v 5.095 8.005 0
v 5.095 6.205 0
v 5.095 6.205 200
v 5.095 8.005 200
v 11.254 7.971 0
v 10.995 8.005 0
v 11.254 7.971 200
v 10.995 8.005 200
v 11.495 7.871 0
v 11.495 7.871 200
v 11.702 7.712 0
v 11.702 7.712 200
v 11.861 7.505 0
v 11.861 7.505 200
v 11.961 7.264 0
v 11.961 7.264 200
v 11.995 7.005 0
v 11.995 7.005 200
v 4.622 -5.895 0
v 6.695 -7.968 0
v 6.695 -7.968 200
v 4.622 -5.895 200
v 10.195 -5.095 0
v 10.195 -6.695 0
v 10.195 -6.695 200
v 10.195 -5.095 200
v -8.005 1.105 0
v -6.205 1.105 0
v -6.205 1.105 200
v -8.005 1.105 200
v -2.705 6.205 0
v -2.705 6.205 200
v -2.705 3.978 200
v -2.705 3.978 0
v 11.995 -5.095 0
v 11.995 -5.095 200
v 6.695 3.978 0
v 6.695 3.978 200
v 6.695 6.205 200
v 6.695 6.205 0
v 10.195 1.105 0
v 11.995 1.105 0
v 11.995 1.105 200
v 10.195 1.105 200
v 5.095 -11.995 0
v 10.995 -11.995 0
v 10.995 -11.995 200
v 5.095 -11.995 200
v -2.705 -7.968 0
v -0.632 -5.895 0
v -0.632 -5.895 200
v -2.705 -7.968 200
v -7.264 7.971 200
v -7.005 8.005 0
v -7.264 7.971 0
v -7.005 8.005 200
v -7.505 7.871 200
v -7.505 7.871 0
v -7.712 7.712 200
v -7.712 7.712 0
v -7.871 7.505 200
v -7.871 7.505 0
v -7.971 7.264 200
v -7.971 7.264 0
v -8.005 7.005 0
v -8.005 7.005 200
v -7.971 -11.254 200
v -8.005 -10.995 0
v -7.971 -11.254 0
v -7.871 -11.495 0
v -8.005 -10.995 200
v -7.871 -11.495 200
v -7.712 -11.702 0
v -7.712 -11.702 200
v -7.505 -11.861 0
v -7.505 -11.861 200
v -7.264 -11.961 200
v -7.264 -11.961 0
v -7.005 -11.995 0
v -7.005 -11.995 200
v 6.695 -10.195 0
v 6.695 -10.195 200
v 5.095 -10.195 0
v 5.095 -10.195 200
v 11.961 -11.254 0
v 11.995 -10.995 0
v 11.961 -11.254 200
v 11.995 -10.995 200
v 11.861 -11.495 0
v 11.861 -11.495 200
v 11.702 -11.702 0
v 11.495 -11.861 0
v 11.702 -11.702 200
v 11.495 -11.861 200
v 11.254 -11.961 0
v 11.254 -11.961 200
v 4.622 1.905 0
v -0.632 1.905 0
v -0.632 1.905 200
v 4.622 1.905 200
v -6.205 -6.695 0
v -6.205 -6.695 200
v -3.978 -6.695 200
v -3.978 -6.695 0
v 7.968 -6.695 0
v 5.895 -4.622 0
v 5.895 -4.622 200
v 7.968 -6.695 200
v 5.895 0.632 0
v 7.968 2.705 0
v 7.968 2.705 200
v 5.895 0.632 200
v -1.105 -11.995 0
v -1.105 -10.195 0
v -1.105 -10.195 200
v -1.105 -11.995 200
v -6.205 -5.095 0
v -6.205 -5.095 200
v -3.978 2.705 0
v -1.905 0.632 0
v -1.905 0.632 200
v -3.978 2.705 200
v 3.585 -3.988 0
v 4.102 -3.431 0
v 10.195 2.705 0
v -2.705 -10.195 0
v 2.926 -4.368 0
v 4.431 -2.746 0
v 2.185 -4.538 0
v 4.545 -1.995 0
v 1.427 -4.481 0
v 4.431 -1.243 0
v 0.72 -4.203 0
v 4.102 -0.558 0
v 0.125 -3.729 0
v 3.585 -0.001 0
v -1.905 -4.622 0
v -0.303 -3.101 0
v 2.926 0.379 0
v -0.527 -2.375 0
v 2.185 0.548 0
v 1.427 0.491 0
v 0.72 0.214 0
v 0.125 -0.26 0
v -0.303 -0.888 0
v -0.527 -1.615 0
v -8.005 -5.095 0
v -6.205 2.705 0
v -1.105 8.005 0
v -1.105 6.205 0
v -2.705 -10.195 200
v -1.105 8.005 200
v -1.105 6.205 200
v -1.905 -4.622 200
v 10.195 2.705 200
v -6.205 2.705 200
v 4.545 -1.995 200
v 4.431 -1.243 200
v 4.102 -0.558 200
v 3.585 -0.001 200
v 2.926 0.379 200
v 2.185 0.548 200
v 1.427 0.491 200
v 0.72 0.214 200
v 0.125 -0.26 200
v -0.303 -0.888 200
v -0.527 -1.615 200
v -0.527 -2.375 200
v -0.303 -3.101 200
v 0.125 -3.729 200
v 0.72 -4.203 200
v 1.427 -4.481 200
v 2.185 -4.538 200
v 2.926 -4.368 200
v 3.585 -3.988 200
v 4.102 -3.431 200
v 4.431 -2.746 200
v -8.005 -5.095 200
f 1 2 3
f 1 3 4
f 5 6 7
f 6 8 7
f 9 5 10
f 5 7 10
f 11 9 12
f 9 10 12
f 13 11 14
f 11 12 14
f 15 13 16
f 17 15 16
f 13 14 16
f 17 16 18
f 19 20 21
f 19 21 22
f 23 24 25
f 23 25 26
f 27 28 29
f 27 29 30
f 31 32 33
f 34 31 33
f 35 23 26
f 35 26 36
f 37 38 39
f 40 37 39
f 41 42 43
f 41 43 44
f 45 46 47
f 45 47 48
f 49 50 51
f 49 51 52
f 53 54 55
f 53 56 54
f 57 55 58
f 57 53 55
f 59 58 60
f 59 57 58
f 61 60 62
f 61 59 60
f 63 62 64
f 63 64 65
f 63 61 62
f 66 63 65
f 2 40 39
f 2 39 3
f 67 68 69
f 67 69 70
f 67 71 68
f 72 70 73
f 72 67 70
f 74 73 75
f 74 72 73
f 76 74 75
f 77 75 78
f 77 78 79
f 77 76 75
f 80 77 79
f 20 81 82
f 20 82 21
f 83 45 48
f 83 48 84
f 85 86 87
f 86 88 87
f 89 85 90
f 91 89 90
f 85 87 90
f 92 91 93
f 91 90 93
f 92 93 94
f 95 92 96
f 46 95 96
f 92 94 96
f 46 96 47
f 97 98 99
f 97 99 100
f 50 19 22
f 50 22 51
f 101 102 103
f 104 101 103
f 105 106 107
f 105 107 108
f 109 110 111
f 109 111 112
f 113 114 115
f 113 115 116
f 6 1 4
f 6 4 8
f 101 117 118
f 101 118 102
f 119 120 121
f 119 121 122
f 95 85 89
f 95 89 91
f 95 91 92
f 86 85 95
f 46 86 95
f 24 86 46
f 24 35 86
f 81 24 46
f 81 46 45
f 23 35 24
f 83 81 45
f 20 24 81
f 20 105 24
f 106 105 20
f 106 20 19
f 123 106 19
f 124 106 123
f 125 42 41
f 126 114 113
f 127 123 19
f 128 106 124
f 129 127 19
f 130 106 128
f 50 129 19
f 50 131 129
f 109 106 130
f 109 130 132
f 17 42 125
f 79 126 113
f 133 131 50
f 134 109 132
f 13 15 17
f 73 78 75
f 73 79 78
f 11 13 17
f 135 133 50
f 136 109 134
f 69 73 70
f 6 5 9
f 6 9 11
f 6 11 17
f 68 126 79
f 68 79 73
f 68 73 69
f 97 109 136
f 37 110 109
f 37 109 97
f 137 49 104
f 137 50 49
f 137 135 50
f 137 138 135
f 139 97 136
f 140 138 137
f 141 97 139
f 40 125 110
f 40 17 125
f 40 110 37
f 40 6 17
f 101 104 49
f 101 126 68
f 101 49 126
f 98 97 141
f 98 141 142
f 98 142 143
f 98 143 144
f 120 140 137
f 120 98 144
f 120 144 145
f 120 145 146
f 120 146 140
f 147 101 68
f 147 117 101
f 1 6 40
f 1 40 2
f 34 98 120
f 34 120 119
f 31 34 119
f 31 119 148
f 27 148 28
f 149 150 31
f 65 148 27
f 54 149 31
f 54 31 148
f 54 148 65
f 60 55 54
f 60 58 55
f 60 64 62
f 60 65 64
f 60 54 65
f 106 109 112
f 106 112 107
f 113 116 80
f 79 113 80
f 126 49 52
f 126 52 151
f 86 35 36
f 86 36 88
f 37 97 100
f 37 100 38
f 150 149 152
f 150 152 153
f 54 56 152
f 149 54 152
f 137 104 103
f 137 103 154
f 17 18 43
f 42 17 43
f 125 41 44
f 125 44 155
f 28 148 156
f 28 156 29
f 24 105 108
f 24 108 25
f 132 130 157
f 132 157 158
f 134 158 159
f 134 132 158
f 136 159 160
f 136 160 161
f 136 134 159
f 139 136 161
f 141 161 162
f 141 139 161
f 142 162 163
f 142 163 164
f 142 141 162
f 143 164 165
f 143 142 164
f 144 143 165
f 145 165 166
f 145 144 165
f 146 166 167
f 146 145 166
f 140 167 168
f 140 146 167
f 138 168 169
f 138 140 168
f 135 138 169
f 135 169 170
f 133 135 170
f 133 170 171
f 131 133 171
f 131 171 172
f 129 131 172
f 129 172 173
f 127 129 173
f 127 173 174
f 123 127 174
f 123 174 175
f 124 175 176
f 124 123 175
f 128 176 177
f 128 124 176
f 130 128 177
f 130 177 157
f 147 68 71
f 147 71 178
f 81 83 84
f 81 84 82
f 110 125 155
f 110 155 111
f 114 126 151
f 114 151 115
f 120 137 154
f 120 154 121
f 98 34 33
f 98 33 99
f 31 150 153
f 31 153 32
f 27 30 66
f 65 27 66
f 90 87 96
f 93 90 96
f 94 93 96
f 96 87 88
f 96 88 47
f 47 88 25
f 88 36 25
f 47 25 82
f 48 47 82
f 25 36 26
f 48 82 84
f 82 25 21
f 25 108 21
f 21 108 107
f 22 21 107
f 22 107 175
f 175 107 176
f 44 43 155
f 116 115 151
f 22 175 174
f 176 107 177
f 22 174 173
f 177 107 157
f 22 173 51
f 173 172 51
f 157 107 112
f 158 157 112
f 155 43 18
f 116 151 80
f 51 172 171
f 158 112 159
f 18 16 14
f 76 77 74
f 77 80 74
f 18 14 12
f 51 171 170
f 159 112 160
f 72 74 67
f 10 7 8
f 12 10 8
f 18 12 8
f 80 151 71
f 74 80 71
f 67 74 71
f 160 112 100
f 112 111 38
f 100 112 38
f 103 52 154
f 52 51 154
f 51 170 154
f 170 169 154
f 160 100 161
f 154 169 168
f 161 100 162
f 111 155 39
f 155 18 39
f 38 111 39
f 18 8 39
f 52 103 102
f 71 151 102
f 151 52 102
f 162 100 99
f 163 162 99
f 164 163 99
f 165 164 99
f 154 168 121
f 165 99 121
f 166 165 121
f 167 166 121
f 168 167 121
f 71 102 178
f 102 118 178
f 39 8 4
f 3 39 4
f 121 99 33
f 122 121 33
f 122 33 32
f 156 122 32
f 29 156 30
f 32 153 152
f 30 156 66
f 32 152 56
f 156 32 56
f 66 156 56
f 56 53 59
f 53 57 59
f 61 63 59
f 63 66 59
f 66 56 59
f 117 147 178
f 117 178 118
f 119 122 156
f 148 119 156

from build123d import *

# Parameters (mm, degrees)
SKETCH_1_R      = 2.55
EXTRUDE_1_DEPTH = 200
FILLET_1_R      = 1


with BuildPart() as part:
    # 草图1 → 凸台-拉伸1 (new body)
    with BuildSketch(Plane.XY):
        Polygon((4.62194142, 1.905266374), (6.694733626, 3.97805858), (6.694733626, 6.205266374), (5.094733626, 6.205266374), (5.094733626, 8.005266374), (11.994733626, 8.005266374), (11.994733626, 1.105266374), (10.194733626, 1.105266374), (10.194733626, 2.705266374), (7.967525833, 2.705266374), (5.894733626, 0.632474167), (5.894733626, -4.62194142), (7.967525833, -6.694733626), (10.194733626, -6.694733626), (10.194733626, -5.094733626), (11.994733626, -5.094733626), (11.994733626, -11.994733626), (5.094733626, -11.994733626), (5.094733626, -10.194733626), (6.694733626, -10.194733626), (6.694733626, -7.967525833), (4.62194142, -5.894733626), (-0.632474167, -5.894733626), (-2.705266374, -7.967525833), (-2.705266374, -10.194733626), (-1.105266374, -10.194733626), (-1.105266374, -11.994733626), (-8.005266374, -11.994733626), (-8.005266374, -5.094733626), (-6.205266374, -5.094733626), (-6.205266374, -6.694733626), (-3.97805858, -6.694733626), (-1.905266374, -4.62194142), (-1.905266374, 0.632474167), (-3.97805858, 2.705266374), (-6.205266374, 2.705266374), (-6.205266374, 1.105266374), (-8.005266374, 1.105266374), (-8.005266374, 8.005266374), (-1.105266374, 8.005266374), (-1.105266374, 6.205266374), (-2.705266374, 6.205266374), (-2.705266374, 3.97805858), (-0.632474167, 1.905266374), align=None)
        with Locations((1.994733626, -1.994733626)):
            Circle(SKETCH_1_R, mode=Mode.SUBTRACT)
    extrude(amount=EXTRUDE_1_DEPTH)

    # 圆角1
    fillet_1_edges = [part.edges().sort_by_distance(p)[0] for p in [
        (-8.005266374, -11.994733626, 100),
        (-8.005266374, 8.005266374, 100),
        (11.994733626, 8.005266374, 100),
        (11.994733626, -11.994733626, 100),
    ]]
    fillet(fillet_1_edges, radius=FILLET_1_R)


solid = part.part
